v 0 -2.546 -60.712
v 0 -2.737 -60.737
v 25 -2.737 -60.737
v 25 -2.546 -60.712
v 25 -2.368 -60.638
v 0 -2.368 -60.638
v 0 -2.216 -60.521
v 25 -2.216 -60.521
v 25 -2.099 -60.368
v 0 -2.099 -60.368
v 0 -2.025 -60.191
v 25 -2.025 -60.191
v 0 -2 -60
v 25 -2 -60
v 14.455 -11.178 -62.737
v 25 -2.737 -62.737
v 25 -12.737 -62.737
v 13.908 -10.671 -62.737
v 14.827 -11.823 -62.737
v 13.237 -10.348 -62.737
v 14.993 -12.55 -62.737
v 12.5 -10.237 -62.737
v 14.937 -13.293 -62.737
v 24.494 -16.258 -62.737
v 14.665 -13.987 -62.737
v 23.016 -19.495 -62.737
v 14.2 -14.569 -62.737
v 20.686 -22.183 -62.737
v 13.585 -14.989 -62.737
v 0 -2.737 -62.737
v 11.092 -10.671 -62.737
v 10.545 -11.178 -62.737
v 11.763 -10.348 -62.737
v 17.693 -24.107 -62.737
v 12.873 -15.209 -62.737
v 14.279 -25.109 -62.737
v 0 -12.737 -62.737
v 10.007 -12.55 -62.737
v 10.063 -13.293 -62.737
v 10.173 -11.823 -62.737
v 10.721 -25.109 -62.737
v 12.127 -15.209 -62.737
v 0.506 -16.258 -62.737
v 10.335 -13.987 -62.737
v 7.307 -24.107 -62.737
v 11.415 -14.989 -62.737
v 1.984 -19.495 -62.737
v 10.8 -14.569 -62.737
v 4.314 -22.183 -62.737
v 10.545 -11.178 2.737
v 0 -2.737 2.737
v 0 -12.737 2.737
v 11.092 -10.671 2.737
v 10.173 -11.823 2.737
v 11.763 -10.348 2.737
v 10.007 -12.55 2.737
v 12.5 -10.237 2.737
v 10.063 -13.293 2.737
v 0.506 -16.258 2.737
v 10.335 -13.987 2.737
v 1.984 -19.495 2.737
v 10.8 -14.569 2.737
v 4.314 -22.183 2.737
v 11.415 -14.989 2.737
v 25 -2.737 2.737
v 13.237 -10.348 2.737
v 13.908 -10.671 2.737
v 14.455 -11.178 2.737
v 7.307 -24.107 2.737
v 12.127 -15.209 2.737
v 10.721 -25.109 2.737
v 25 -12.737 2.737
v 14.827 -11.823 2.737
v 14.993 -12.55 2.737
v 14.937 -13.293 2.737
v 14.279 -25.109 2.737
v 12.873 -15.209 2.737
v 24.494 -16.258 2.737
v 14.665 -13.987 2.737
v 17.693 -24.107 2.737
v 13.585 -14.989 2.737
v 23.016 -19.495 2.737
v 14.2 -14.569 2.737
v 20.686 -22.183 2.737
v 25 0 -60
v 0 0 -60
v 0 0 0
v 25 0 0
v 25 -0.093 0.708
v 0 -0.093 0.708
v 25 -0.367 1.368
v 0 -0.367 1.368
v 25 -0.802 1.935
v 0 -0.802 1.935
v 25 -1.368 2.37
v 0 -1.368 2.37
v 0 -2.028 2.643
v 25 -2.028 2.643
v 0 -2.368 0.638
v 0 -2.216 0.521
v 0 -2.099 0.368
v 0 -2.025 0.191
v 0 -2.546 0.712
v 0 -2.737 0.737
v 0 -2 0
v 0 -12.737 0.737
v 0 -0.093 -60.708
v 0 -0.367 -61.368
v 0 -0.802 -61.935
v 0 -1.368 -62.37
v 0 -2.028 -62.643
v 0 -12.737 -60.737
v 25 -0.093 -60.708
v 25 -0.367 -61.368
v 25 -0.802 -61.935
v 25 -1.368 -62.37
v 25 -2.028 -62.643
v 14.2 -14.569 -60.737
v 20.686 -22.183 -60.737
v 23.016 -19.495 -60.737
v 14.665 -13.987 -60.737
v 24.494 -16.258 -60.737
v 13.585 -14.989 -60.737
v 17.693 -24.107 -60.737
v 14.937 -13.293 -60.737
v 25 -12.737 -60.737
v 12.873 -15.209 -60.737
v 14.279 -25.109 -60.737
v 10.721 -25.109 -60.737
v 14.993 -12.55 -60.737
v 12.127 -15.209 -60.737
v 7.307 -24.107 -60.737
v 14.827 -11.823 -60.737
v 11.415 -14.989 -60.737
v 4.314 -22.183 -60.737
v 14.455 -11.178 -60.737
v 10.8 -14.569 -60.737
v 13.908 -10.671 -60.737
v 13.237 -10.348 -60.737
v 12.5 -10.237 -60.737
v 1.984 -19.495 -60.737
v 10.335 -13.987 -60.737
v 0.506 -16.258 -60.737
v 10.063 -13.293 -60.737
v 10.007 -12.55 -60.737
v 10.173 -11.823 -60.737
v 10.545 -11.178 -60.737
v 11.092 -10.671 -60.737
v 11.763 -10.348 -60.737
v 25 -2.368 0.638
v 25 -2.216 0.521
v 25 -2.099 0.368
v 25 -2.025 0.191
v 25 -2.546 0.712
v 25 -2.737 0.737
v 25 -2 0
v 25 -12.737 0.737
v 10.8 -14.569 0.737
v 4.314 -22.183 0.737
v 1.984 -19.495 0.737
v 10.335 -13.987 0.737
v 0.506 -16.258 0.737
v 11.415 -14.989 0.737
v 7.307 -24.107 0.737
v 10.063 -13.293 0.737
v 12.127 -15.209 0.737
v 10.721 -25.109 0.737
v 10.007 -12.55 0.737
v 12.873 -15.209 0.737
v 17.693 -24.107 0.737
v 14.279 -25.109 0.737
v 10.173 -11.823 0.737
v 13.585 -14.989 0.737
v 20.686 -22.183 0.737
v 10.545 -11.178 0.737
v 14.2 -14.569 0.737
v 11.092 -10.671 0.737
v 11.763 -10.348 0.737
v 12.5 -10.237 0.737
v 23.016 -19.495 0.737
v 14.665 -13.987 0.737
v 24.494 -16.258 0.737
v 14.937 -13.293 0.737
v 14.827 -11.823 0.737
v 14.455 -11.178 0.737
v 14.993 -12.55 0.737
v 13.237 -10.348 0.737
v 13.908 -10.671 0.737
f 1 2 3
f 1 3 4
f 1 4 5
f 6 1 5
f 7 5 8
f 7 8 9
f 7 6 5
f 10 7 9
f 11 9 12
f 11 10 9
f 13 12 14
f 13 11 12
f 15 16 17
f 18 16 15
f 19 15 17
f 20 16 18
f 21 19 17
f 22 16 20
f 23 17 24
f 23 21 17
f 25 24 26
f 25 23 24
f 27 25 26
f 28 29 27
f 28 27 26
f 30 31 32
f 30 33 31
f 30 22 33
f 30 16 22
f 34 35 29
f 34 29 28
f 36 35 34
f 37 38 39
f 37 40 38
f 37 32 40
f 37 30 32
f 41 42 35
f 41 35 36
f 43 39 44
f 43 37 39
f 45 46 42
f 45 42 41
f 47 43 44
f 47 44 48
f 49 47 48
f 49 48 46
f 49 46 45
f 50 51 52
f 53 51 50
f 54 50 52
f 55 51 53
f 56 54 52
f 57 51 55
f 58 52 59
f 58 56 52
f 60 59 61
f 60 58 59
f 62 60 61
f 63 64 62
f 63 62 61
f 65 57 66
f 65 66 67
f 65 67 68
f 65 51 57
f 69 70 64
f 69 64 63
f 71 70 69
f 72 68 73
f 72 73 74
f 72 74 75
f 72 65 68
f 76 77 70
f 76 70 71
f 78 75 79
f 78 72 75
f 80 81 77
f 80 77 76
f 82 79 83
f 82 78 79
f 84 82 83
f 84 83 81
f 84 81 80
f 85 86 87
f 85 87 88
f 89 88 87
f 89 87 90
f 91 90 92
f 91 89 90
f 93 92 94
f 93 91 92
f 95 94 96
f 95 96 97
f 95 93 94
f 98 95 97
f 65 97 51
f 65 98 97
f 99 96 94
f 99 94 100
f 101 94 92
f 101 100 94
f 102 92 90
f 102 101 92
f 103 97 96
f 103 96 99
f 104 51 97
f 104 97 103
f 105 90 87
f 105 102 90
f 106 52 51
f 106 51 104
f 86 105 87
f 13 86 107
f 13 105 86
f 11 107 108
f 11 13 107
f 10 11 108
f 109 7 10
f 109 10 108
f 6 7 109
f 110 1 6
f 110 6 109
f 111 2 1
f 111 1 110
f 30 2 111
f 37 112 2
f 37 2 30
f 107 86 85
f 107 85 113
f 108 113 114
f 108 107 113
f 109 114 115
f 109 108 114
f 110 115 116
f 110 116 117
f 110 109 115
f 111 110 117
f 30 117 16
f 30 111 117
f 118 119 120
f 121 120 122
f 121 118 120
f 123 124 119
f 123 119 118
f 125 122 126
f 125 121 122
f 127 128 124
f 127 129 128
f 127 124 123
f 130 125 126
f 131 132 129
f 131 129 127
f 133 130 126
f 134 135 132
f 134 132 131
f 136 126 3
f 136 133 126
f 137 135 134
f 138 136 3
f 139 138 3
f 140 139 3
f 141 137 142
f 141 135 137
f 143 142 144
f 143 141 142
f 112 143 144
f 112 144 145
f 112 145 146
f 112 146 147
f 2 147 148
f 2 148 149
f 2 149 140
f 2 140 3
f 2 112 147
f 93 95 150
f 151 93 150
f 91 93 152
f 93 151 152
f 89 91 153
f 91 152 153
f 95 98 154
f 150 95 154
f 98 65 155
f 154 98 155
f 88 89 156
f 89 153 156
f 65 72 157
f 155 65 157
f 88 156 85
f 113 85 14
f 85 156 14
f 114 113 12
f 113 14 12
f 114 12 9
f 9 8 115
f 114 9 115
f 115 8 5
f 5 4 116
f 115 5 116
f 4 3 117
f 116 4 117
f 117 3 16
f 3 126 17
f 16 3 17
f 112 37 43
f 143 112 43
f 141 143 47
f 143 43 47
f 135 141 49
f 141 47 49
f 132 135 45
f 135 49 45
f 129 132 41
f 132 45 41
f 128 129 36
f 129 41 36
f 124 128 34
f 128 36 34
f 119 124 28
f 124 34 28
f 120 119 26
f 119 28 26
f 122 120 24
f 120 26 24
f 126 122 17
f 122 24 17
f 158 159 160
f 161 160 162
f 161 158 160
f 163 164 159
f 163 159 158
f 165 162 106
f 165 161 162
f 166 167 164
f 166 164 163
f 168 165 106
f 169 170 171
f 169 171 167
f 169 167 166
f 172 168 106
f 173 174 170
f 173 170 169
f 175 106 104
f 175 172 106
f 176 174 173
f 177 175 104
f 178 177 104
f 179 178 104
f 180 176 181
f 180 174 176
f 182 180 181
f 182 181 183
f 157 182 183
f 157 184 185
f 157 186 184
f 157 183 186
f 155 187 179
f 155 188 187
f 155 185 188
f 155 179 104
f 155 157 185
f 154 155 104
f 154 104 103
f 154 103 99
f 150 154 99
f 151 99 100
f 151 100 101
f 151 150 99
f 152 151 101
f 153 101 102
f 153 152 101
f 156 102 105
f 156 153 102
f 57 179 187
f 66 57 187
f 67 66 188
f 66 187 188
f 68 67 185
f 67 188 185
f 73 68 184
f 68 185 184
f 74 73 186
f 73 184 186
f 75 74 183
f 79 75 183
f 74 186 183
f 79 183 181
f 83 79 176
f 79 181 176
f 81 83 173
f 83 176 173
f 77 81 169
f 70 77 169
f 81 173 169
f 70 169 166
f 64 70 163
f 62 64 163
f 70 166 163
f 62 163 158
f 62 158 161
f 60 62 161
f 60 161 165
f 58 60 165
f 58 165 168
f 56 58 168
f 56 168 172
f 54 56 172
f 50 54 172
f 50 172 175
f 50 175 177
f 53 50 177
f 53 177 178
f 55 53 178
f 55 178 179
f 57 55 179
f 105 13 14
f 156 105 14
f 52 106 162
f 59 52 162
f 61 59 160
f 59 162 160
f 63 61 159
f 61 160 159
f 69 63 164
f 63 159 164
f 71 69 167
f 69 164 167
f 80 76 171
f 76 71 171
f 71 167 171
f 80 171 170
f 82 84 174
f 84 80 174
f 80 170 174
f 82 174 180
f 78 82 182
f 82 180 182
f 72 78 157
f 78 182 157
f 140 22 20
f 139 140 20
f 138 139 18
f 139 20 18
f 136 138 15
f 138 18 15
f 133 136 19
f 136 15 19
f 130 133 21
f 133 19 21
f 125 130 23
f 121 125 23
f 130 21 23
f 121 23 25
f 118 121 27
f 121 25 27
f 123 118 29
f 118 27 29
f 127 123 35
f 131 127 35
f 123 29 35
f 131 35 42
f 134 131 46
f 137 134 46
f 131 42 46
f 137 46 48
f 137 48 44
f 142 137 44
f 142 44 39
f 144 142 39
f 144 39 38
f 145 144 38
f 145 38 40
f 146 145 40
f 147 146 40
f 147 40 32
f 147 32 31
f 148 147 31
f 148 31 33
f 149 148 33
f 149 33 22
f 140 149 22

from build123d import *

# Parameters (mm, degrees)
SKETCH1_W               = 25
SKETCH1_H               = 60
BASE_FLANGE1_DEPTH      = 2
EDGE_FLANGE1_DEPTH      = 25
EDGE_FLANGE1_BEND_DEPTH = 25
CUT_EXTRUDE1_REACH      = 78.235
SKETCH12_R              = 2.5


# Sheet-metal steps are written as plain solids
with BuildPart() as part:
    # Sketch1 → Base-Flange1 (new body)
    with BuildSketch(Plane(origin=(0, 0, 0), x_dir=(1, 0, 0), z_dir=(0, 1, 0))):
        with Locations((12.5, 30)):
            Rectangle(SKETCH1_W, SKETCH1_H)
    extrude(amount=-BASE_FLANGE1_DEPTH)

    # Edge-Flange1 section (across the edge) → Edge-Flange1 (add)
    with BuildSketch(Plane(origin=(25, -2, 0.7366), x_dir=(0, 0, -1), z_dir=(-1, 0, 0))):
        with BuildLine():
            Line((-2, 0.7366), (-2, 28))
            Line((-2, 28), (0, 28))
            Line((0, 28), (0, 0.7366))
            ThreePointArc((0, 0.7366), (0.215745145, 0.215745145), (0.7366, 0))
            Line((0.7366, 0), (0.7366, -2))
            ThreePointArc((0.7366, -2), (-1.198468417, -1.198468417), (-2, 0.7366))
        make_face()
    extrude(amount=EDGE_FLANGE1_DEPTH)

    # Edge-Flange1 section 2 (across the edge) → Edge-Flange1 bend (add)
    with BuildSketch(Plane(origin=(0, -2, -60.7366), x_dir=(0, 0, 1), z_dir=(1, 0, 0))):
        with BuildLine():
            Line((-2, 0.7366), (-2, 28))
            Line((-2, 28), (0, 28))
            Line((0, 28), (0, 0.7366))
            ThreePointArc((0, 0.7366), (0.215745145, 0.215745145), (0.7366, 0))
            Line((0.7366, 0), (0.7366, -2))
            ThreePointArc((0.7366, -2), (-1.198468417, -1.198468417), (-2, 0.7366))
        make_face()
    extrude(amount=EDGE_FLANGE1_BEND_DEPTH)

    # Cut-Extrude1: up to this face of the body (flat: up to its plane)
    cut_extrude1_end = Plane(part.part.faces().sort_by_distance((12.5, -16.3683, 2.7366))[0])
    # Sketch12 → Cut-Extrude1 (cut, up to the picked face)
    with BuildSketch(Plane(origin=(0, 0, -62.7366), x_dir=(-1, 0, 0), z_dir=(0, 0, -1)), mode=Mode.PRIVATE) as cut_extrude1_sk1:
        with Locations(Location((-12.5, -12.7366, 0), (0, 0, 90))):
            Circle(SKETCH12_R)
    cut_extrude1_tool1 = split(extrude(cut_extrude1_sk1.sketch, amount=-CUT_EXTRUDE1_REACH, mode=Mode.PRIVATE), bisect_by=cut_extrude1_end, keep=Keep.BOTH, mode=Mode.PRIVATE)
    # Sketch12 → Cut-Extrude1 (cut, up to the picked face)
    with BuildSketch(Plane(origin=(0, 0, -62.7366), x_dir=(-1, 0, 0), z_dir=(0, 0, -1)), mode=Mode.PRIVATE) as cut_extrude1_sk2:
        with BuildLine():
            Line((-25, -12.7366), (-25, -30))
            Line((-25, -30), (0, -30))
            Line((0, -30), (0, -12.7366))
            ThreePointArc((0, -12.7366), (-12.5, -25.2366), (-25, -12.7366))
        make_face()
    cut_extrude1_tool2 = split(extrude(cut_extrude1_sk2.sketch, amount=-CUT_EXTRUDE1_REACH, mode=Mode.PRIVATE), bisect_by=cut_extrude1_end, keep=Keep.BOTH, mode=Mode.PRIVATE)
    add(cut_extrude1_tool1.solids().sort_by(Axis((12.5, -12.7366, -62.7366), (0, 0, 1)))[0], mode=Mode.SUBTRACT)
    add(cut_extrude1_tool2.solids().sort_by(Axis((12.5, -25.754349, -62.7366), (0, 0, 1)))[0], mode=Mode.SUBTRACT)


solid = part.part
